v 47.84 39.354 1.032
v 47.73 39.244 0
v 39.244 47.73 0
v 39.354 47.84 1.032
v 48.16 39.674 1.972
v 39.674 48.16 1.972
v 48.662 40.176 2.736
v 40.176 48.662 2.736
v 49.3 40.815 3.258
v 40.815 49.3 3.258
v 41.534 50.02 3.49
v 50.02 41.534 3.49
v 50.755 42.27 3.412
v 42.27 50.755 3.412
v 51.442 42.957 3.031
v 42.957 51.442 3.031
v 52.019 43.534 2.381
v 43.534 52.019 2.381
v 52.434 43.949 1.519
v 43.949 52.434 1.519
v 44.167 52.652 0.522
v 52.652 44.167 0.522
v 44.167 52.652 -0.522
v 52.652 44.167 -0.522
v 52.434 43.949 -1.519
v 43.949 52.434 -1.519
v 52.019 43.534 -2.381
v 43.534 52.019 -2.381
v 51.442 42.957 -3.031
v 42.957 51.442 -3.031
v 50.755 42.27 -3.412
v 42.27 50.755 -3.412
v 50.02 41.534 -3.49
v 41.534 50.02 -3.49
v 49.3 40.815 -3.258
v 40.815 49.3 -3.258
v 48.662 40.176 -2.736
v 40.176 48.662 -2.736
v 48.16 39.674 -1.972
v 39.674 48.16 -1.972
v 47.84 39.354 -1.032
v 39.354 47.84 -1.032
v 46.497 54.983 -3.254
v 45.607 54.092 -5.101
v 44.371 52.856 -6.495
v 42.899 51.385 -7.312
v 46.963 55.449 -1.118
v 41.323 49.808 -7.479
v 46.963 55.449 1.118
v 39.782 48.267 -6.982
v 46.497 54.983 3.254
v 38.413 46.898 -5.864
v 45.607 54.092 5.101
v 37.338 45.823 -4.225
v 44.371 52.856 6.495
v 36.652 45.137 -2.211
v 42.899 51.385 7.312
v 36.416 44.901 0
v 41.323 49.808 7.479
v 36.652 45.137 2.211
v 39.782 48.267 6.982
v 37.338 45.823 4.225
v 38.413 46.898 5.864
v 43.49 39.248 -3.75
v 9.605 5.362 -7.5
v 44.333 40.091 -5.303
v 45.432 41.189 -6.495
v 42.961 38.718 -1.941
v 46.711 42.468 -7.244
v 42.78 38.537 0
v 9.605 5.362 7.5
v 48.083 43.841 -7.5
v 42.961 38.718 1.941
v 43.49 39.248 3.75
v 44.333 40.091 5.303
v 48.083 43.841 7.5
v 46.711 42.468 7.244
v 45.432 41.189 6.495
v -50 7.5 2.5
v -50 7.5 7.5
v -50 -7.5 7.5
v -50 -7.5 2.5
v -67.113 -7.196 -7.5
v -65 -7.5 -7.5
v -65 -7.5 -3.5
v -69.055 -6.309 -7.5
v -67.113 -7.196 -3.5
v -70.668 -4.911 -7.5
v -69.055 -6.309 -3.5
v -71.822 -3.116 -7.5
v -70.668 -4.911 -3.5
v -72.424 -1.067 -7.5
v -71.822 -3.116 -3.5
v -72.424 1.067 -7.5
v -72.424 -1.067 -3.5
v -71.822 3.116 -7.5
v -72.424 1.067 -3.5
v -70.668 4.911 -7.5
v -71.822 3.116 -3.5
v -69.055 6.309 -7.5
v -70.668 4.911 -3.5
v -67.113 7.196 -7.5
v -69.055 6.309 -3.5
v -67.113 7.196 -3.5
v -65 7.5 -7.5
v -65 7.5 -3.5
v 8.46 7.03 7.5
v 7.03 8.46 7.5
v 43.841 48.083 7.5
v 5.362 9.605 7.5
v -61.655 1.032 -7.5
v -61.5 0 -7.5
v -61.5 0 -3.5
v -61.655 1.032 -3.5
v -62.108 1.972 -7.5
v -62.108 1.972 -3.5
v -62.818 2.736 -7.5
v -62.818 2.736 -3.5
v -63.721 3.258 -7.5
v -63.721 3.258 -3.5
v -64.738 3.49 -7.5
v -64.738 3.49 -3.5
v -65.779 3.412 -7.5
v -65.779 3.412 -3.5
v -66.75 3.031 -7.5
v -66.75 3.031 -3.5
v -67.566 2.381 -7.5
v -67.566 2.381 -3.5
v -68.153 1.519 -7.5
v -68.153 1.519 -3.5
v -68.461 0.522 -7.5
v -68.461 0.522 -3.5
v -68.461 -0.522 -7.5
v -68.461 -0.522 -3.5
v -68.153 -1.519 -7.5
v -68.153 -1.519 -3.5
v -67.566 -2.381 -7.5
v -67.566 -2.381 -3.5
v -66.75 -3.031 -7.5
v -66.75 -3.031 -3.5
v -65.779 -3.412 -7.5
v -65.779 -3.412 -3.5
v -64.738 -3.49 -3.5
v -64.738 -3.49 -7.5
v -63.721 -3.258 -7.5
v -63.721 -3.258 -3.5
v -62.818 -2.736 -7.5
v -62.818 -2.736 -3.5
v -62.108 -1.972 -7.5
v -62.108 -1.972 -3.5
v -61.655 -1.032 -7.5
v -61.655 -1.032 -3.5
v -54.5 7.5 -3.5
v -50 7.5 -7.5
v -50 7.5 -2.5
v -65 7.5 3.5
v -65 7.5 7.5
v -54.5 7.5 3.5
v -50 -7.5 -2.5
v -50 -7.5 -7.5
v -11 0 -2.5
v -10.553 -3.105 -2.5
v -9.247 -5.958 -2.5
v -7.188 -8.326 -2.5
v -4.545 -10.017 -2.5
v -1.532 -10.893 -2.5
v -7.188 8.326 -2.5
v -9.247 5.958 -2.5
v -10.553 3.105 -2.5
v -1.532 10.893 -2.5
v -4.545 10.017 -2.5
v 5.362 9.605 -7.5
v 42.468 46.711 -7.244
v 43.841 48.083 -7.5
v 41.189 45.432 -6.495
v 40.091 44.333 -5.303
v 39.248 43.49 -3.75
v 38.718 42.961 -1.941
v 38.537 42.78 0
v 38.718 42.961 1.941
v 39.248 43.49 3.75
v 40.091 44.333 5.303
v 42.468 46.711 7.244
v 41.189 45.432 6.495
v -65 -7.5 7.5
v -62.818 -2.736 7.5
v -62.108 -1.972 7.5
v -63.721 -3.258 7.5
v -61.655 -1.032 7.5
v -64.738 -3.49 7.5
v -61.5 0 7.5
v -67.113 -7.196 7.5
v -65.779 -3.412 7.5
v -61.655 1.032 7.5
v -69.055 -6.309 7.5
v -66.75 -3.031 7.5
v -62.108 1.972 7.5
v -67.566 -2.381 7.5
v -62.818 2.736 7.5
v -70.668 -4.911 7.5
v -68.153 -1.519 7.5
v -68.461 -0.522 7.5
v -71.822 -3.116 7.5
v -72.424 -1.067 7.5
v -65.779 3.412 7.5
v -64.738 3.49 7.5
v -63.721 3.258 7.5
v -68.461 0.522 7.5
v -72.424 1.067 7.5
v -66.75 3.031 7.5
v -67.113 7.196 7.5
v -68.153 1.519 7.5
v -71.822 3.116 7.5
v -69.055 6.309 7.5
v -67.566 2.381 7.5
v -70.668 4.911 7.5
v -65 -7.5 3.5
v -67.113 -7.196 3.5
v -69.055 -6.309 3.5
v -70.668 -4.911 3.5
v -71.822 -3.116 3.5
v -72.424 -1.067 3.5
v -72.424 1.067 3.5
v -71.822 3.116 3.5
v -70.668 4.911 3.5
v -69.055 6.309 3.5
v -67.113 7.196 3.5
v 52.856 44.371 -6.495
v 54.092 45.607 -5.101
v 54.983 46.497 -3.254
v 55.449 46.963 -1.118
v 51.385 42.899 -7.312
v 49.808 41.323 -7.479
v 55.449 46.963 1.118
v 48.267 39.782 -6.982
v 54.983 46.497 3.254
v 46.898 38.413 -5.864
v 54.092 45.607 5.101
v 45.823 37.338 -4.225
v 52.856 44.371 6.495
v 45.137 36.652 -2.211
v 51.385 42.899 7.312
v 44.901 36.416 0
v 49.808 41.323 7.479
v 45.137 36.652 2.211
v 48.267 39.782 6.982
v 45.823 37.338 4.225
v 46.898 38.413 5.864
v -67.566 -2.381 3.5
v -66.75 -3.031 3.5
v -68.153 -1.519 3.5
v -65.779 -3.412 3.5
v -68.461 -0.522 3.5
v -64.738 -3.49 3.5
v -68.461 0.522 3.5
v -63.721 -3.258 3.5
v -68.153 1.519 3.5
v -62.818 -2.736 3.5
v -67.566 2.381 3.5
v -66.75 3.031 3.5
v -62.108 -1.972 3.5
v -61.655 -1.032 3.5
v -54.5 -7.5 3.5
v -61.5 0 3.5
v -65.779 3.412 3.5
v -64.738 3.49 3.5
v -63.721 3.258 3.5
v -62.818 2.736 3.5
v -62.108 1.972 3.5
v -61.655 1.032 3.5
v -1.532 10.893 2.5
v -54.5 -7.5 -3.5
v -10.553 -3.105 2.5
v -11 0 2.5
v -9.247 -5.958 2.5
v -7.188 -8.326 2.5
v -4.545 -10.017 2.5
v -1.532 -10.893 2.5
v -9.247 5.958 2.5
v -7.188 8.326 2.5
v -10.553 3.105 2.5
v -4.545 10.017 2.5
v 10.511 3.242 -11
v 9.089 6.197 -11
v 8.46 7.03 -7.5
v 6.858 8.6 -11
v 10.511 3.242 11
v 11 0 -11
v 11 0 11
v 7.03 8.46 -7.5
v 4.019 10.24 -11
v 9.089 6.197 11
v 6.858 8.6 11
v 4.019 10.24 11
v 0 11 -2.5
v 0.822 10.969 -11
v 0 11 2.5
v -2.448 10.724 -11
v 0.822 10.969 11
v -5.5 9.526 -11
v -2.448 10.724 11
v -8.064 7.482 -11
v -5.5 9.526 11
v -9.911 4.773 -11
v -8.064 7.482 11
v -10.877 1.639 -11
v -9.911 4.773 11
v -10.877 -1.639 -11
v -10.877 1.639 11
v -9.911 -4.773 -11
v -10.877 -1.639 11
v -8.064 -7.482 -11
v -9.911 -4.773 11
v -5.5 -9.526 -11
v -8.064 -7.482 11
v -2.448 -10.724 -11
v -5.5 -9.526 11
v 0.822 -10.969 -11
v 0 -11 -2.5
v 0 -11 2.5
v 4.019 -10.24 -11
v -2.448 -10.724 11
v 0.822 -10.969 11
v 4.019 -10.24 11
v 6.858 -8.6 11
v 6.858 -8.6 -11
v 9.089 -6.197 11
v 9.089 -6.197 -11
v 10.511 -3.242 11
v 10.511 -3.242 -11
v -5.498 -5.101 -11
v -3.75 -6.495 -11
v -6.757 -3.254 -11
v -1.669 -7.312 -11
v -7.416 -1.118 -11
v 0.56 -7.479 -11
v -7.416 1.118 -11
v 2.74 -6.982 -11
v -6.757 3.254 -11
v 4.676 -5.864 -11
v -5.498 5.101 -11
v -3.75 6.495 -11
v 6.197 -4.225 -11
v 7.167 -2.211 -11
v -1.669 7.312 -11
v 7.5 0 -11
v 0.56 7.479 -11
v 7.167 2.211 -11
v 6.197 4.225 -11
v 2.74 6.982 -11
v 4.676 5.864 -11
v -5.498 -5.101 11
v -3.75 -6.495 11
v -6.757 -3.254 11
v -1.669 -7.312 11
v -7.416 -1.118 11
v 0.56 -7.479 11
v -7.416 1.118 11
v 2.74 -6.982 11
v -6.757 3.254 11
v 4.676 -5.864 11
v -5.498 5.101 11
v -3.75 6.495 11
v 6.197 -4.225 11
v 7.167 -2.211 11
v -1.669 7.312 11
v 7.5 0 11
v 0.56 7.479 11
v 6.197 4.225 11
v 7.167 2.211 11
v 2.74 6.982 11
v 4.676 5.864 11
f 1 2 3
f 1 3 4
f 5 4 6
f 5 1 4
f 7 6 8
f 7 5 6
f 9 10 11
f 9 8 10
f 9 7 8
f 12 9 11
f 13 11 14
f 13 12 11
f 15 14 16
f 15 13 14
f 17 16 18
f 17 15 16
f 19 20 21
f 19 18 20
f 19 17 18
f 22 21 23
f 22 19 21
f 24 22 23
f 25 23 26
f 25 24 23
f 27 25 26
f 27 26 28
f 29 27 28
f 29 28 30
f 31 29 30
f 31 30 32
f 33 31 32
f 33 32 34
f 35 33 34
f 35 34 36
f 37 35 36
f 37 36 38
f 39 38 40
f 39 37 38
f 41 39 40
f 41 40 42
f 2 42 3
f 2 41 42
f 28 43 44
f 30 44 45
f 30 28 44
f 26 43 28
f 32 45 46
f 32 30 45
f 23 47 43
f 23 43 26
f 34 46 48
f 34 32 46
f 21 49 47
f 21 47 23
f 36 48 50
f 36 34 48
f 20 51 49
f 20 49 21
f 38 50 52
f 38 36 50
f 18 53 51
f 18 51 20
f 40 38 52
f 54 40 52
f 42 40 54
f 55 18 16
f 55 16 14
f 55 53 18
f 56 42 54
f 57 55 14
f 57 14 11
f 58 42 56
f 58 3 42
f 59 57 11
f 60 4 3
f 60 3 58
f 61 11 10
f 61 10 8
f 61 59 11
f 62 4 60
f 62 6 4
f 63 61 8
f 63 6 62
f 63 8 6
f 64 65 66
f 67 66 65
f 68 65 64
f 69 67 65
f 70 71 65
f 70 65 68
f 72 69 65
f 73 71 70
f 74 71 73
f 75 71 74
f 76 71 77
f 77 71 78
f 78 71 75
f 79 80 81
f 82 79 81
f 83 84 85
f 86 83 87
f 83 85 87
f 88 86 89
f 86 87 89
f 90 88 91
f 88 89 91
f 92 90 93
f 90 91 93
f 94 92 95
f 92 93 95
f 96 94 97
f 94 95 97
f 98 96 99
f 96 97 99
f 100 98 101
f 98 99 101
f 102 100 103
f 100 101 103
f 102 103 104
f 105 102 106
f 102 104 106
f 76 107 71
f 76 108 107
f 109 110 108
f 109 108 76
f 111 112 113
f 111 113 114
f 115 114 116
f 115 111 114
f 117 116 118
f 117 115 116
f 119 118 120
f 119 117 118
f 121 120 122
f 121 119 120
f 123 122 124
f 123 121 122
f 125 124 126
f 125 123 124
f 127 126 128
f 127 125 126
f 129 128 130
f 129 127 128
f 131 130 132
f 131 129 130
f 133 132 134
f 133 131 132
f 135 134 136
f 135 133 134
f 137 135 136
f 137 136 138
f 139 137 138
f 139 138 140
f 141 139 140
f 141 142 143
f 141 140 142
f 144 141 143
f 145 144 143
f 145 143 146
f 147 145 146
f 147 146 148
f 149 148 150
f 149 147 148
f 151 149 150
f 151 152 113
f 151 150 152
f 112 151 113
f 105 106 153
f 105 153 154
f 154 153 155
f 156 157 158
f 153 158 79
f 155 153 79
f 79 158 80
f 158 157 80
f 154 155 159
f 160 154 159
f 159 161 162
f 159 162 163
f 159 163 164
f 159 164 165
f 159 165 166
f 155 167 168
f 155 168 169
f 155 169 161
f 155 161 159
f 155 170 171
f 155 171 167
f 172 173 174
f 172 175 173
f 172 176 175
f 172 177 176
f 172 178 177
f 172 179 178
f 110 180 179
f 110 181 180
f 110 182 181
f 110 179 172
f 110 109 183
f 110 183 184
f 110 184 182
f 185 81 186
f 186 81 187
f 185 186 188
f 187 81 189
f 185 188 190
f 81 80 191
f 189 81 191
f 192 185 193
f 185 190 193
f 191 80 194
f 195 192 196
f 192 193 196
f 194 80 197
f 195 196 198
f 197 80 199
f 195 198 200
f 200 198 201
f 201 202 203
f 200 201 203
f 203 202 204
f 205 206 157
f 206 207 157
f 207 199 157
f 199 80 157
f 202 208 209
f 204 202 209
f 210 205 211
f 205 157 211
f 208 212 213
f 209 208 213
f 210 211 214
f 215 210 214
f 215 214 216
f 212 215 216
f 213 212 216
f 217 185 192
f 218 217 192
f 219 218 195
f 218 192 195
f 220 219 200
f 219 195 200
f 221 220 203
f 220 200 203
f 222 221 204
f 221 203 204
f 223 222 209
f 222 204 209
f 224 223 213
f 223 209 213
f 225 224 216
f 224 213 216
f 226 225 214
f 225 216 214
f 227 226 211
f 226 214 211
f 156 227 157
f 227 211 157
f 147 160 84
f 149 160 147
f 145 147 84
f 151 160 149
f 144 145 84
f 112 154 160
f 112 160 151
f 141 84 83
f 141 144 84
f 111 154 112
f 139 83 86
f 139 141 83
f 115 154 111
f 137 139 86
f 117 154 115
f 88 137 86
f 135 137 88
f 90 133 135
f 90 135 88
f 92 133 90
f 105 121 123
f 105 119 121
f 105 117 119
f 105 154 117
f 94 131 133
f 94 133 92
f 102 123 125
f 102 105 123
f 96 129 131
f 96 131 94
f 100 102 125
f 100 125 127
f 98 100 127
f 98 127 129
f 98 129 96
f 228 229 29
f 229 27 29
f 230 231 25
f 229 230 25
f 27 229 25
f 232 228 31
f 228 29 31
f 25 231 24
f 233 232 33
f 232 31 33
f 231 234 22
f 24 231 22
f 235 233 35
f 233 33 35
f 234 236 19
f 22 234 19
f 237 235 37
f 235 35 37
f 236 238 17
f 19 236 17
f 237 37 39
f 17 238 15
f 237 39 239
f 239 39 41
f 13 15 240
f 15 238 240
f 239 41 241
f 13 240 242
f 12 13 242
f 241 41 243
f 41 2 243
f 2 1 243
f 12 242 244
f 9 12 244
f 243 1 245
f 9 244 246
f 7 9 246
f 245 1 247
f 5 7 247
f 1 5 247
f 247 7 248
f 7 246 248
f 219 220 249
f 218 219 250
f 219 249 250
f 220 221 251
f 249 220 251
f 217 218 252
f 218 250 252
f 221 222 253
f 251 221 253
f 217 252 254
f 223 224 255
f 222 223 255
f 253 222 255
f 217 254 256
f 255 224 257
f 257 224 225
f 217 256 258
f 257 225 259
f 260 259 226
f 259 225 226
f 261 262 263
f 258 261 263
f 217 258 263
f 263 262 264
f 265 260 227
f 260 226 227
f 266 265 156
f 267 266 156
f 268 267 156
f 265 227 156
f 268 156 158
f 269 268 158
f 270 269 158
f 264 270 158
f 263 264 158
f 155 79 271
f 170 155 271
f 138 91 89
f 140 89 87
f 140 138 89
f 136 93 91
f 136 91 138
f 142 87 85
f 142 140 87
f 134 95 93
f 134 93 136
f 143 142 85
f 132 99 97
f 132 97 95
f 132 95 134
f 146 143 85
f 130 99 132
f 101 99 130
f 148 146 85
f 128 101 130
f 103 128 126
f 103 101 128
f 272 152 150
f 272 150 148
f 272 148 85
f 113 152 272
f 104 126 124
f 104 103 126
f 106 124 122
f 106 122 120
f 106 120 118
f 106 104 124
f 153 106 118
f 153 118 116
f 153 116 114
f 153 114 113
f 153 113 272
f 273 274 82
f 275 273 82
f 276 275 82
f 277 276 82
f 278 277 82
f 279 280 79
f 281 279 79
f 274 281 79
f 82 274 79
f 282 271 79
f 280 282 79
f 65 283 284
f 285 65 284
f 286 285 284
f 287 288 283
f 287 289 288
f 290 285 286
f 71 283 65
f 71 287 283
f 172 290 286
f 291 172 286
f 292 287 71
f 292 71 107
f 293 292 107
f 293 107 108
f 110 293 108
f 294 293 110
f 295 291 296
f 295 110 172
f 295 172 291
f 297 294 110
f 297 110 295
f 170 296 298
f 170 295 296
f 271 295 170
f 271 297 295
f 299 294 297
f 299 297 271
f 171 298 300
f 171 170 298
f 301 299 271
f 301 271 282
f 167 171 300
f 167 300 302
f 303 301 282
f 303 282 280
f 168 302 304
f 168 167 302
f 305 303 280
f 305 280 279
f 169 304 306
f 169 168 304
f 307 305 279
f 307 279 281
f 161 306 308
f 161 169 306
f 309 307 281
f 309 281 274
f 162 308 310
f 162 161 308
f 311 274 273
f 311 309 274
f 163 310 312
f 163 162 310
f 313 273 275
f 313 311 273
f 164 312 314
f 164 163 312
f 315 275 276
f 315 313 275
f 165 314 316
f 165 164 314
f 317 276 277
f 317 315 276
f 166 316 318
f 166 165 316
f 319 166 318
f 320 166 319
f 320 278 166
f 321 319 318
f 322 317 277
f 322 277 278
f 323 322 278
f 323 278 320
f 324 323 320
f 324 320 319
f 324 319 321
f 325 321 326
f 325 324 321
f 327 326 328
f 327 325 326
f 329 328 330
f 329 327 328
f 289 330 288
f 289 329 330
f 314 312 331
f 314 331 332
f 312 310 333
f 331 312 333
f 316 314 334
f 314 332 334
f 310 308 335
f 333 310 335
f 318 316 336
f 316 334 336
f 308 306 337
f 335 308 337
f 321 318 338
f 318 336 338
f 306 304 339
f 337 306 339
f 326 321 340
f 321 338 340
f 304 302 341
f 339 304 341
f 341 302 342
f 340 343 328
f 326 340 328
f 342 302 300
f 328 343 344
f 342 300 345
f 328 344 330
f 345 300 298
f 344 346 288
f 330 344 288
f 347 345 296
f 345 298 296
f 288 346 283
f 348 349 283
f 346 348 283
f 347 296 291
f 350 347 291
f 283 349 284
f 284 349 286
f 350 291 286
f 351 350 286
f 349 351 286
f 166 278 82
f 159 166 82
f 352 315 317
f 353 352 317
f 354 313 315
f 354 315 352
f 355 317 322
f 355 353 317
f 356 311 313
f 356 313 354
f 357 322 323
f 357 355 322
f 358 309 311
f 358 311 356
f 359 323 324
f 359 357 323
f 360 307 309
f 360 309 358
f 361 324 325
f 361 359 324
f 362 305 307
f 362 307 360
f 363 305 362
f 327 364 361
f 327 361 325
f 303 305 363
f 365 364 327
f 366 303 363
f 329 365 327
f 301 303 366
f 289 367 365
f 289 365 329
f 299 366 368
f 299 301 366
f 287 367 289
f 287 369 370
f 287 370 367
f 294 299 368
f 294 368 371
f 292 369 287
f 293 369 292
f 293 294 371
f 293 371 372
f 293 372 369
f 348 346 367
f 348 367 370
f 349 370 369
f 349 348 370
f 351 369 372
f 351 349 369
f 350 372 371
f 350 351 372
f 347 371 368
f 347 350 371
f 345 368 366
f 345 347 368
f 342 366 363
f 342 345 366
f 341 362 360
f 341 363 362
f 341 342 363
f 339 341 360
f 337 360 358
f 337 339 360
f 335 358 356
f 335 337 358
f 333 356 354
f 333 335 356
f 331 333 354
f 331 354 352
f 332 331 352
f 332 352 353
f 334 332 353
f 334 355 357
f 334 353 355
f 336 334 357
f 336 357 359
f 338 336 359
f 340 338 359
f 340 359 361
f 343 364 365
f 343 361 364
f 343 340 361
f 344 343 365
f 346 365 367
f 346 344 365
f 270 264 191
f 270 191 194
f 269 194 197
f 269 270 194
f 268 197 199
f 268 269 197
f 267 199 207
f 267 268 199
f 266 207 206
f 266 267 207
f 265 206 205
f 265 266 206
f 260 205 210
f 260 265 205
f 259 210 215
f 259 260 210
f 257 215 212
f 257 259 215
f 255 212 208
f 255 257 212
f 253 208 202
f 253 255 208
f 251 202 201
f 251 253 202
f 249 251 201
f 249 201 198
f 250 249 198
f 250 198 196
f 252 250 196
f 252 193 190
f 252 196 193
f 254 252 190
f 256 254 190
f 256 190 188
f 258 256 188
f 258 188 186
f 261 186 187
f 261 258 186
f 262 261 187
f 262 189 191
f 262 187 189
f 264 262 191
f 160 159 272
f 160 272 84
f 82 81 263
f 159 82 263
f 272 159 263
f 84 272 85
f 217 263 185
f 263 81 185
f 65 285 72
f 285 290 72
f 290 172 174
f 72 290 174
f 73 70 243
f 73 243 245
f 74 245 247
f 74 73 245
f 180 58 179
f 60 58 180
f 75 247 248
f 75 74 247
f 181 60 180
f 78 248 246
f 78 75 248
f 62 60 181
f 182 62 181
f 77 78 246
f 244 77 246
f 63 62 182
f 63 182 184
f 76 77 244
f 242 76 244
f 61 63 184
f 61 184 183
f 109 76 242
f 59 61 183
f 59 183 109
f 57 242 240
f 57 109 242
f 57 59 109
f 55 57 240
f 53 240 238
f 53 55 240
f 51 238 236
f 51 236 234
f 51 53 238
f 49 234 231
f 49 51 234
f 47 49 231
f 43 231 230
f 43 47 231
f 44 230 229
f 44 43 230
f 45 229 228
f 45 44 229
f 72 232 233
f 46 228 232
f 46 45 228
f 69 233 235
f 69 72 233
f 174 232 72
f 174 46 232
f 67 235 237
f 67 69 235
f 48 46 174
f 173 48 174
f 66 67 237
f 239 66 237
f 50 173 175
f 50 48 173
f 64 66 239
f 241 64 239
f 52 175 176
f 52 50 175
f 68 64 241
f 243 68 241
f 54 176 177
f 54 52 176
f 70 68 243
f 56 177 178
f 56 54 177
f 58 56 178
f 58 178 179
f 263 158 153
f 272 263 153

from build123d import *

# Parameters (mm, degrees)
RESSALTO_EXTRUS_O1_DEPTH   = 7.5
ESBO_O2_R                  = 11
RESSALTO_EXTRUS_O2_DEPTH   = 11
RESSALTO_EXTRUS_O4_DEPTH   = 2.5
RESSALTO_EXTRUS_O5_DEPTH   = 7.5
ESBO_O5_R                  = 7.5
RESSALTO_EXTRUS_O6_DEPTH   = 6
ESBO_O6_W                  = 21
ESBO_O6_H                  = 7
CORTE_EXTRUS_O1_DEPTH      = 88.647057938
CORTE_EXTRUS_O3_DEPTH      = 92.969424267
CORTE_EXTRUS_O3_DEPTH_BACK = 92.969424267
ESBO_O7_R                  = 3.5
CORTE_EXTRUS_O5_DEPTH      = 92.969424267
CORTE_EXTRUS_O5_DEPTH_BACK = 92.969424267
ESBO_O8_R                  = 7.5
CORTE_EXTRUS_O6_DEPTH      = 87.070855116
CORTE_EXTRUS_O6_DEPTH_BACK = 87.070855116
ESBO_O9_R                  = 3.5


with BuildPart() as part:
    # Esboço1 → Ressalto-extrusão1 (new, symmetric)
    with BuildSketch(Plane.XY):
        with BuildLine():
            Line((-65, 7.5), (-50, 7.5))
            Line((-50, 7.5), (-50, -7.5))
            Line((-50, -7.5), (-65, -7.5))
            ThreePointArc((-65, -7.5), (-72.5, 0), (-65, 7.5))
        make_face()
    extrude(amount=RESSALTO_EXTRUS_O1_DEPTH, both=True)



with BuildPart() as body_2:
    # Esboço2 → Ressalto-extrusão2 (new, symmetric)
    with BuildSketch(Plane.XY):
        Circle(ESBO_O2_R)
    extrude(amount=RESSALTO_EXTRUS_O2_DEPTH, both=True)


with BuildPart() as part_1:
    add(part.part)

    add(body_2.part)  # Ressalto-extrusão4 merges body 2
    # Esboço3 → Ressalto-extrusão4 (add, symmetric)
    with BuildSketch(Plane.XY):
        Polygon((-50, 7.5), (0, 11), (0, -11), (-50, -7.5), align=None)
    extrude(amount=RESSALTO_EXTRUS_O4_DEPTH, both=True)

    # Esboço4 → Ressalto-extrusão5 (add, symmetric)
    with BuildSketch(Plane.XY):
        Polygon((2.121320344, -2.121320344), (48.083261121, 43.840620434), (43.840620434, 48.083261121), (-2.121320344, 2.121320344), align=None)
    extrude(amount=RESSALTO_EXTRUS_O5_DEPTH, both=True)

    # Esboço5 → Ressalto-extrusão6 (add, symmetric)
    with BuildSketch(Plane(origin=(0, 0, 0), x_dir=(0, 0, 1), z_dir=(-0.7071067811865488, 0.7071067811865464, 0))):
        with Locations(Location((0, 65, 0), (0, 0, 270))):
            Circle(ESBO_O5_R)
    extrude(amount=RESSALTO_EXTRUS_O6_DEPTH, both=True)

    # Esboço6 → Corte-extrusão1 (cut, through all)
    with BuildSketch(Plane(origin=(0, 7.5, 0), x_dir=(1, 0, 0), z_dir=(0, 1, 0))):
        with Locations((-65, 0)):
            Rectangle(ESBO_O6_W, ESBO_O6_H)
    extrude(amount=-CORTE_EXTRUS_O1_DEPTH, mode=Mode.SUBTRACT)

    # Esboço7 → Corte-extrusão3 (cut, two sides: drawn at the far end of the back side and taken through both)
    with BuildSketch(Plane.XY.offset(-CORTE_EXTRUS_O3_DEPTH_BACK)):
        with Locations((-65, 0)):
            Circle(ESBO_O7_R)
    extrude(amount=CORTE_EXTRUS_O3_DEPTH + CORTE_EXTRUS_O3_DEPTH_BACK, mode=Mode.SUBTRACT)

    # Esboço8 → Corte-extrusão5 (cut, two sides: drawn at the far end of the back side and taken through both)
    with BuildSketch(Plane.XY.offset(-CORTE_EXTRUS_O5_DEPTH_BACK)):
        Circle(ESBO_O8_R)
    extrude(amount=CORTE_EXTRUS_O5_DEPTH + CORTE_EXTRUS_O5_DEPTH_BACK, mode=Mode.SUBTRACT)

    # Esboço9 → Corte-extrusão6 (cut, two sides: drawn at the far end of the back side and taken through both)
    with BuildSketch(Plane(origin=(-4.242640687, 4.242640687, 0), x_dir=(0, 0, 1), z_dir=(-0.7071067811865487, 0.7071067811865465, 0)).offset(-CORTE_EXTRUS_O6_DEPTH_BACK)):
        with Locations(Location((0, 65, 0), (0, 0, 270))):
            Circle(ESBO_O9_R)
    extrude(amount=CORTE_EXTRUS_O6_DEPTH + CORTE_EXTRUS_O6_DEPTH_BACK, mode=Mode.SUBTRACT)


solid = part_1.part
